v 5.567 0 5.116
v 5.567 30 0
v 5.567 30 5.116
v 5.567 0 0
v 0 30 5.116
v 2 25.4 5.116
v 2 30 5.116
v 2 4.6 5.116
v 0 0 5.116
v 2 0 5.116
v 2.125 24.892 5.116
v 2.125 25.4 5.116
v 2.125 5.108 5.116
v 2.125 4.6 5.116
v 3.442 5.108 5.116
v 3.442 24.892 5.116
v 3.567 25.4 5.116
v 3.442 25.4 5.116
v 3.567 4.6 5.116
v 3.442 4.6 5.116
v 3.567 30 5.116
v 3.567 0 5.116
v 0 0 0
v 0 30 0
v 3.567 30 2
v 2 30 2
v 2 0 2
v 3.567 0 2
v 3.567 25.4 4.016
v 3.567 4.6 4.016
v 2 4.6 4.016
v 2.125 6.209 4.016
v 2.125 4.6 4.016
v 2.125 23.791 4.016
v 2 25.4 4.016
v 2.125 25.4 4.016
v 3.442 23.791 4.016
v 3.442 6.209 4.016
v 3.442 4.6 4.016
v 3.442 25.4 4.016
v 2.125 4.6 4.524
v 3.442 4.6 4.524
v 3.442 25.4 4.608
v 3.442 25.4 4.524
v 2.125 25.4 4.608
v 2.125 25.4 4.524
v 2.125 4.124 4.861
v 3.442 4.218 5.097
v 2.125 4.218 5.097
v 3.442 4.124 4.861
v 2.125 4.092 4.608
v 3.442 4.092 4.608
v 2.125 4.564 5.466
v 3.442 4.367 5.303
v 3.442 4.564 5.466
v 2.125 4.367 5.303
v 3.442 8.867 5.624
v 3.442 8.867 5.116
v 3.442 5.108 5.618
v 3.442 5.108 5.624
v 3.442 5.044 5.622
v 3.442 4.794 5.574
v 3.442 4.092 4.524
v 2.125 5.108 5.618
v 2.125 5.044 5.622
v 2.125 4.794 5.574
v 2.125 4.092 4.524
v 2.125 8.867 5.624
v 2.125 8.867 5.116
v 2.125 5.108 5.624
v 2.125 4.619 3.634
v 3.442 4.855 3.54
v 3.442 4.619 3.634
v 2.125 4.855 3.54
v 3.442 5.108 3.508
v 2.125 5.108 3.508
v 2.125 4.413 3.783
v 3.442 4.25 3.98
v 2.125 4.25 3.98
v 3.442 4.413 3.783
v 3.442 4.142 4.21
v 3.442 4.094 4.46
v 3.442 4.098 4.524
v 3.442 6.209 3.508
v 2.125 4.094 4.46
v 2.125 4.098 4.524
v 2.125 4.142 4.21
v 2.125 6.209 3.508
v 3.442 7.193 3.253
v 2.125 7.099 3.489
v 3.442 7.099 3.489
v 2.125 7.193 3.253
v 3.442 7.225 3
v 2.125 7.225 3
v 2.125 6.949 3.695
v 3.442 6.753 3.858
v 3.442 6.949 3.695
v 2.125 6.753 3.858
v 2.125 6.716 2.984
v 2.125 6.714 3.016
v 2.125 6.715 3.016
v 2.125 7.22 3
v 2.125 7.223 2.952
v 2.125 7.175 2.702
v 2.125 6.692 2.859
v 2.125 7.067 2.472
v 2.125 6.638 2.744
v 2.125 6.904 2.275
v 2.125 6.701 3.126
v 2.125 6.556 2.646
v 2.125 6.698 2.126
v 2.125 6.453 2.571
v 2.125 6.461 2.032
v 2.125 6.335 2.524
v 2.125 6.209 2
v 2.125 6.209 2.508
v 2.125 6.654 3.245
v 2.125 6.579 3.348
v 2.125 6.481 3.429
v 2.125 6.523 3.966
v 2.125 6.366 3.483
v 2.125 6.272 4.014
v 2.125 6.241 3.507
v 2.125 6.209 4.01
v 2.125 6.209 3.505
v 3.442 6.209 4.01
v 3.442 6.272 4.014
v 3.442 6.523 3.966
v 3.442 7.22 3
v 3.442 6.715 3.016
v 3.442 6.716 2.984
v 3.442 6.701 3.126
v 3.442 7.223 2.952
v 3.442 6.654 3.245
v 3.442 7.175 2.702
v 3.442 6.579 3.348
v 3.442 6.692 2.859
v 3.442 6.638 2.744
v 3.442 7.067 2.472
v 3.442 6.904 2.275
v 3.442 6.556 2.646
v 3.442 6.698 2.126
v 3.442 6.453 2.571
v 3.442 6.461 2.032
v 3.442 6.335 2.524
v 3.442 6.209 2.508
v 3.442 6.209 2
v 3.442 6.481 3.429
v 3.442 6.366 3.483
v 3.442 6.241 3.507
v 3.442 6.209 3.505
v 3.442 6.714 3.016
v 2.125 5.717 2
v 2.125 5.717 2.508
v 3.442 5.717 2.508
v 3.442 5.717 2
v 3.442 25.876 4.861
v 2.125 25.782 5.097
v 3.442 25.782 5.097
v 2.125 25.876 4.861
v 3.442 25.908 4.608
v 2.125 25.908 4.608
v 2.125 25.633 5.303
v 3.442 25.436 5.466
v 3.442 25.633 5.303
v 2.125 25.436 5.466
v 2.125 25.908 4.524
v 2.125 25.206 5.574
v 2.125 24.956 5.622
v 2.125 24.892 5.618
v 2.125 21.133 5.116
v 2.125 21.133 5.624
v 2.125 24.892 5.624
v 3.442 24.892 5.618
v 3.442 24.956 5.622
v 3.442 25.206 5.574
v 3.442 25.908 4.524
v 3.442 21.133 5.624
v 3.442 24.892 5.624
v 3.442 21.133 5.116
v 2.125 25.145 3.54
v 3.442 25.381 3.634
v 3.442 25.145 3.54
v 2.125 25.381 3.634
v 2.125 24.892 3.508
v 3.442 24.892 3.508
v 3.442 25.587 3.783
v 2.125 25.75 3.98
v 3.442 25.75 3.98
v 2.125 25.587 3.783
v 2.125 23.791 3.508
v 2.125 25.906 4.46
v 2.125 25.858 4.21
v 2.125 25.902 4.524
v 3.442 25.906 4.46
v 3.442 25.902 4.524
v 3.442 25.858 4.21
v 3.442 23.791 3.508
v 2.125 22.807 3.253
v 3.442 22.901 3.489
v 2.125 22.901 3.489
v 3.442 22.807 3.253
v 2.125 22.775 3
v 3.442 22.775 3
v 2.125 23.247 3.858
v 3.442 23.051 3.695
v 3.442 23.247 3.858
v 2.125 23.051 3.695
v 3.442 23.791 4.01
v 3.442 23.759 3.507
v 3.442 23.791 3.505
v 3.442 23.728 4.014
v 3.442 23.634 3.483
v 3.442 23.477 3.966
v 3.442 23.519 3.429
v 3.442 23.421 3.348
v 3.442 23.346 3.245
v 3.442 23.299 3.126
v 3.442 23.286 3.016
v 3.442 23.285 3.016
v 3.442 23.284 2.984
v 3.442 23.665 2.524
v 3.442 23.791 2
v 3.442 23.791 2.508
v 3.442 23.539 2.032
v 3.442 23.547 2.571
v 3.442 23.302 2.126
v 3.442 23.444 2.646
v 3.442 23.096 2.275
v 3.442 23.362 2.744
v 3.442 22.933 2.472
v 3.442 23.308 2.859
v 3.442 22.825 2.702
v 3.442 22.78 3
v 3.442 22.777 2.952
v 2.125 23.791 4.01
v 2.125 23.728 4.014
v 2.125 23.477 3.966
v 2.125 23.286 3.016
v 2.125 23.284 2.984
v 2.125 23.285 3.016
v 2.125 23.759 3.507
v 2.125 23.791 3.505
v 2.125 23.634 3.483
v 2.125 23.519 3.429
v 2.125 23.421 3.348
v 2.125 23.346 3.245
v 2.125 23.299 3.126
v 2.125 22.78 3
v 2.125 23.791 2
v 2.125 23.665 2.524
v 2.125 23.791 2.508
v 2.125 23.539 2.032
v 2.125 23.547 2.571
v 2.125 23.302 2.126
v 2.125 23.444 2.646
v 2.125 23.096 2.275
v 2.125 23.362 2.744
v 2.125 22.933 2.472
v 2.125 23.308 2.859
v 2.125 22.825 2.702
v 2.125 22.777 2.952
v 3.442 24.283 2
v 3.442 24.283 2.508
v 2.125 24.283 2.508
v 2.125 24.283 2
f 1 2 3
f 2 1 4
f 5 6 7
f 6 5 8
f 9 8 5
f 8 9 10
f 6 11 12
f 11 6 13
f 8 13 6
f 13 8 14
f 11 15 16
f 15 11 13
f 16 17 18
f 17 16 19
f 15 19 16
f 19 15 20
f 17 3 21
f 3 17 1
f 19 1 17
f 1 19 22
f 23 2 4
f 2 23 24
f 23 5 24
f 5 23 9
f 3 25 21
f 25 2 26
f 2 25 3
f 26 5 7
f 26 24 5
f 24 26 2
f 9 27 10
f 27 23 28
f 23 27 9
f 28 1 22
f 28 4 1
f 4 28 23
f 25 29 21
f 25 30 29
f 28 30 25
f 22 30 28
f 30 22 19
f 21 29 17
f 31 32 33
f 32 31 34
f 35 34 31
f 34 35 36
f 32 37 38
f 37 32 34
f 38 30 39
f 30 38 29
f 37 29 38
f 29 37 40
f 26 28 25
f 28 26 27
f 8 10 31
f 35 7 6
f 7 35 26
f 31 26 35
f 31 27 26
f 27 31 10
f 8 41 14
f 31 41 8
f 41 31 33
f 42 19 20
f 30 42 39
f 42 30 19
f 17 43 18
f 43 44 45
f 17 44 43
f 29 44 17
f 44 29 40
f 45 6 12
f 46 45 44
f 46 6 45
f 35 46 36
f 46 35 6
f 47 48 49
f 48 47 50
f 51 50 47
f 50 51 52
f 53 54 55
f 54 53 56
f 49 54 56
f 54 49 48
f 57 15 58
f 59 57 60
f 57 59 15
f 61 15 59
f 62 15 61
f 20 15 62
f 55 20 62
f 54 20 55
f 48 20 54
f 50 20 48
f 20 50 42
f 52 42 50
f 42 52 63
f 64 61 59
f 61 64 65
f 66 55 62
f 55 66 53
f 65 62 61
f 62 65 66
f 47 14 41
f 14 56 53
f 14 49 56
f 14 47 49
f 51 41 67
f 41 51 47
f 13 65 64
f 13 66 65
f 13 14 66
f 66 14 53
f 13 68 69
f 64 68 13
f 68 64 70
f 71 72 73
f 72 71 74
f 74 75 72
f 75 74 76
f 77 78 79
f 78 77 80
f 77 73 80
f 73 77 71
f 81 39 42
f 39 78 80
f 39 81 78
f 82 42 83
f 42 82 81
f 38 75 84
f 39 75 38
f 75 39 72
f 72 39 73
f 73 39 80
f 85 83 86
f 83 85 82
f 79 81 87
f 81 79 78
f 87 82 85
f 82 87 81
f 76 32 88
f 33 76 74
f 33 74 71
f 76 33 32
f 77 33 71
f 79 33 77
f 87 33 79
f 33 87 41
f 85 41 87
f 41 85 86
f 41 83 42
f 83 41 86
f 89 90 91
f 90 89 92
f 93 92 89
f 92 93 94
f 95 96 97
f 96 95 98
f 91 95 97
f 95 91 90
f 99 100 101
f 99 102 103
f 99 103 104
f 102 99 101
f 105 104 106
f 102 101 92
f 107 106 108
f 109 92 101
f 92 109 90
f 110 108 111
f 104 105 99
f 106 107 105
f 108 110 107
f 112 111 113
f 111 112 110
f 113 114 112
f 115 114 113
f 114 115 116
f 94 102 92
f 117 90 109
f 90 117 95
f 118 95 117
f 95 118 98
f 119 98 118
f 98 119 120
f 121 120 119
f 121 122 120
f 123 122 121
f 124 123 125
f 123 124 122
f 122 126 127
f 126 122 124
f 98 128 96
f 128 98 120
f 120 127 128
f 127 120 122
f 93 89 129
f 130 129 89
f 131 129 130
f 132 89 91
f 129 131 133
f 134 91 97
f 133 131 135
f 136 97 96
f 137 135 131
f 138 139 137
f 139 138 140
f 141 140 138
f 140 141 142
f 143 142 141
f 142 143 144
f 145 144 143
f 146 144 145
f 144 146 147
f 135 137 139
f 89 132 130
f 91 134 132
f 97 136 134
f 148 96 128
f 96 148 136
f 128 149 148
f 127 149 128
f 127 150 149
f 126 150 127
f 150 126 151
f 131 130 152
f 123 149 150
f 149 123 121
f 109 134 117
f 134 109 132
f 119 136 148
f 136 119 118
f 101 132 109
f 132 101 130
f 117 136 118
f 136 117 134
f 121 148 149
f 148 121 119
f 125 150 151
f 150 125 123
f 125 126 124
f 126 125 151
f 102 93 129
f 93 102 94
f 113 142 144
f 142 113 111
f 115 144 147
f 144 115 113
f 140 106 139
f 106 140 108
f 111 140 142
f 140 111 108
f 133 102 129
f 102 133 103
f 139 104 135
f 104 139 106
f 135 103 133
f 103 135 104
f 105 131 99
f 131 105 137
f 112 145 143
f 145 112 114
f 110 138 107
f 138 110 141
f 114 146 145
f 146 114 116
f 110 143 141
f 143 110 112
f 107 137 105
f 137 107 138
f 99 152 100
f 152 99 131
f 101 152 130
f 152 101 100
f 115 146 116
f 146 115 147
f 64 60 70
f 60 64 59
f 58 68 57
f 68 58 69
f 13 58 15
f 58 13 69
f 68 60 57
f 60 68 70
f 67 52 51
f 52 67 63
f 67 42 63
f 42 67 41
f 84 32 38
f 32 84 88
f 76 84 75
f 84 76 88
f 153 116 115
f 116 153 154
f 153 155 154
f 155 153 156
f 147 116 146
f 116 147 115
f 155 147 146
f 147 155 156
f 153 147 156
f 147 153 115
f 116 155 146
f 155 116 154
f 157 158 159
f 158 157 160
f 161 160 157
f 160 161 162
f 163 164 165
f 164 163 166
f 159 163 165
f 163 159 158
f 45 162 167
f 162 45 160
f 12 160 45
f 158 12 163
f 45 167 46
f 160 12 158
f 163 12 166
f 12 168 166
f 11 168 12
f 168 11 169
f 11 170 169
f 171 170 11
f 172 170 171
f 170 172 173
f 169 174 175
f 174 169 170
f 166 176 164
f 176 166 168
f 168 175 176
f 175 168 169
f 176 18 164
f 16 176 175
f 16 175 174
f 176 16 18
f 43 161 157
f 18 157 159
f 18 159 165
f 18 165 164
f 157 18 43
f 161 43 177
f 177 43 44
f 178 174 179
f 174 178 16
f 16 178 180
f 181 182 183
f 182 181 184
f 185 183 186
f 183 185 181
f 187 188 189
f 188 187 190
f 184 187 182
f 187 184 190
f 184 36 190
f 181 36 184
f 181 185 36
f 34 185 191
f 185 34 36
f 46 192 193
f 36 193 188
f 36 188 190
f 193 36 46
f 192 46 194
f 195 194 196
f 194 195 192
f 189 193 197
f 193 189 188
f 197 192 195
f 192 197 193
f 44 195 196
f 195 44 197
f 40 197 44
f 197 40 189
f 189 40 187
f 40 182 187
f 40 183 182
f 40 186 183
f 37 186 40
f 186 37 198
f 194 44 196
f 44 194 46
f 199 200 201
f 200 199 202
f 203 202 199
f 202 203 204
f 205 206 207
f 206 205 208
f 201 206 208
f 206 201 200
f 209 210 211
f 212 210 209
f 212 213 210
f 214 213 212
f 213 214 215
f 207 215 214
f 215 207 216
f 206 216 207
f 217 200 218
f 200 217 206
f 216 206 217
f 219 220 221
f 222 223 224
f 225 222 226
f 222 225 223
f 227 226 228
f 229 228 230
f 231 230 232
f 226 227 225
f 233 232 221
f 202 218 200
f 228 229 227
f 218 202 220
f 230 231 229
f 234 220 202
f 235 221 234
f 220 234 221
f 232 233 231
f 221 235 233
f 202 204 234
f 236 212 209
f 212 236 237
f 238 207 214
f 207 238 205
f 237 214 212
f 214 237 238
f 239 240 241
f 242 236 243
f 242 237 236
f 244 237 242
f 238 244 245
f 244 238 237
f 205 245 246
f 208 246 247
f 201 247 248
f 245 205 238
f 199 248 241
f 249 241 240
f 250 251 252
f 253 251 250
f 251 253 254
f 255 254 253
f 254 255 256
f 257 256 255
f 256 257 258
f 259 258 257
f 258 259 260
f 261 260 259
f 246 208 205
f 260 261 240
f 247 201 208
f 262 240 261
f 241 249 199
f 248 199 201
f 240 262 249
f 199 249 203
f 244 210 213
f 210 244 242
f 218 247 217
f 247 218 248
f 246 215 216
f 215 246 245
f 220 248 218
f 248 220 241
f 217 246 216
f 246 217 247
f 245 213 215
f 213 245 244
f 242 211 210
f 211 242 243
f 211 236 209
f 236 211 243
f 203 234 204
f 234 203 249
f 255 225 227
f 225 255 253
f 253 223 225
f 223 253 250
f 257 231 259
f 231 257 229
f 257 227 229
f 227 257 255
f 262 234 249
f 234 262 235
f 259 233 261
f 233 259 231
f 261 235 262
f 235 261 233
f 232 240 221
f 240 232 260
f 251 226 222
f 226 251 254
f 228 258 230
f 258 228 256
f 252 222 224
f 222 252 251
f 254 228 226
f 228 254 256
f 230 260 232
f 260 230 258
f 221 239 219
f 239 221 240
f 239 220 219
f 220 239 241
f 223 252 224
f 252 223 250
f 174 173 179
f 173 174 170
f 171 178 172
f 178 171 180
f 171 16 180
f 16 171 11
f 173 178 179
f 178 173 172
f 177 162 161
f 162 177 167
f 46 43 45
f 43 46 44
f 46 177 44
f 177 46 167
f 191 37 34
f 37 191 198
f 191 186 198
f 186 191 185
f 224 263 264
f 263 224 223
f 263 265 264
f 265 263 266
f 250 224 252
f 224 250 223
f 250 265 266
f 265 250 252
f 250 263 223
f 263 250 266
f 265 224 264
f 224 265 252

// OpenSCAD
// file: util.scad
/*
    This file is part of the DodoHand project. This project aims to create 
    an open implementation of the DataHand keyboard, capable of being created
    with commercial 3D printing services.

    Copyright (C) 2014 Scott Fohey

    This program is free software: you can redistribute it and/or modify
    it under the terms of the GNU General Public License as published by
    the Free Software Foundation, either version 3 of the License, or
    (at your option) any later version.

    This program is distributed in the hope that it will be useful,
    but WITHOUT ANY WARRANTY; without even the implied warranty of
    MERCHANTABILITY or FITNESS FOR A PARTICULAR PURPOSE.  See the
    GNU General Public License for more details.

    You should have received a copy of the GNU General Public License
    along with this program.  If not, see <http://www.gnu.org/licenses/>.
*/

module half_cube(x, y, z) {

  polyhedron(points = [[0,0,0], [0, 0, z], [x, 0, 0], 
              [0,y,0], [0, y, z], [x, y, 0]], 
             faces = [[0,1,2], 
                      [0,3,4], [0,4,1], 
                      [1,4,5], [1,5,2], 
                      [2,5,3], [2,3,0],
                      [3,5,4]],
             convexity = 1);
}

module pos_cube(x, y, z, w, l, h) {
  translate([x, y, z]) cube([w, l, h]);
}

module pos_c_cube(x, y, z, w, l, h) {
  translate([x, y, z]) cube([w, l, h], center=true);
}

module pos_c_half_sphere(x, y, z, sr, f) {
  translate([x, y, z]) {
    difference() {
      sphere(r=sr, $fn=f, center=true);
      translate([-2.*sr, 0, -2*sr]) cube([4*sr, 4*sr, 4*sr]);
    } // difference
  } // translate
}
// file: LiteOn_P_100_E302.scad
/*
    This file is part of the DodoHand project. This project aims to create 
    an open implementation of the DataHand keyboard, capable of being created
    with commercial 3D printing services.

    Copyright (C) 2013 Scott Fohey

    This program is free software: you can redistribute it and/or modify
    it under the terms of the GNU General Public License as published by
    the Free Software Foundation, either version 3 of the License, or
    (at your option) any later version.

    This program is distributed in the hope that it will be useful,
    but WITHOUT ANY WARRANTY; without even the implied warranty of
    MERCHANTABILITY or FITNESS FOR A PARTICULAR PURPOSE.  See the
    GNU General Public License for more details.

    You should have received a copy of the GNU General Public License
    along with this program.  If not, see <http://www.gnu.org/licenses/>.
*/

include <dimensions.scad>;

module soldercone(a, b, c) {
  // cone for relief of material where solder may wick, and heat highest
  // echo("soldercone x,y,z:", a, ", ", b, ", ", c);
  translate([a, b, c]) {
    cylinder(r1 = sc_l_r, r2 = sc_u_r, h = sc_h, $fn=gfn);
  }
}

module Nom_Everlight_PT908_7B_F(x, y, z) {
  translate([x, y, z]) {
    rotate(a=90, v=[0,0,1]) {
      union() {
        color([0.15,0.15,0.15,1]) {
          cube([irlb_w, irlb_d, irlb_h]);
          translate([irle_x, irle_y, irle_z]) sphere(irle_r, $fn=gfn);
        }
        color("LightSteelBlue") {
          translate([irlcath_x, irll_y, -irptlead_h]) 
            cube([irll_w, irll_d, irptlead_h+csg_tol]);
          translate([irlanod_x, irll_y, -irptlead_h]) 
            cube([irll_w, irll_d, irptlead_h+csg_tol]);
        }
      }
    }
  }
}  


module Nom_LiteOn_P_100_E302(x, y, z) {
  translate([x, y, z]) {
    rotate(a=90, v=[0,0,1]) {
      union() {
        color("Salmon") {
          cube([irlb_w, irlb_d, irlb_h]);
          translate([irle_x, irle_y, irle_z]) sphere(irle_r, $fn=gfn);
        }
        color("LightSteelBlue") {
          translate([irlcath_x, irll_y, -irlcath_h]) 
            cube([irll_w, irll_d, irlcath_h+csg_tol]);
          translate([irlanod_x, irll_y, -irlanod_h]) 
            cube([irll_w, irll_d, irlanod_h+csg_tol]);
        }
      }
    }
  }
}  

// this is the shape of the part at it's maximum-tolerance size.
module Max_LiteOn_P_100_E302(x, y, z, scz) {
  translate([x, y, z]) {
    rotate(a=90, v=[0,0,1]) {
      union() {
        color("Salmon") {
          cube([irlb_m_w, irlb_m_d, irlb_m_h]);
          translate([irle_m_x, irle_m_y, irle_m_z]) 
            sphere(irle_m_r, $fn=gfn);
        }
        color("LightSteelBlue") {
          // make the leads thicker on the max part so that it can be used
          // for subtracting out of the volume of the carrier.
          translate([irlcath_m_x, irll_m_y, -irlcath_h]) 
            cube([irll_m_w, irll_m_d, irlcath_h+csg_tol]);
          translate([irlanod_m_x, irll_m_y, -irlanod_h]) 
            cube([irll_m_w, irll_m_d, irlanod_h+csg_tol]);
          soldercone(irlanod_m_x + irll_m_w/2, 
                      irll_m_y + irll_m_d/2, 
                      scz-z); 
          soldercone(irlcath_m_x + irll_m_w/2, 
                      irll_m_y + irll_m_d/2, 
                      scz-z);
        }
      }
    }
  }
}
// file: tdds.scad
/*
    This file is part of the DodoHand project. This project aims to create 
    an open implementation of the DataHand keyboard, capable of being created
    with commercial 3D printing services.

    Copyright (C) 2014 Scott Fohey

    This program is free software: you can redistribute it and/or modify
    it under the terms of the GNU General Public License as published by
    the Free Software Foundation, either version 3 of the License, or
    (at your option) any later version.

    This program is distributed in the hope that it will be useful,
    but WITHOUT ANY WARRANTY; without even the implied warranty of
    MERCHANTABILITY or FITNESS FOR A PARTICULAR PURPOSE.  See the
    GNU General Public License for more details.

    You should have received a copy of the GNU General Public License
    along with this program.  If not, see <http://www.gnu.org/licenses/>.
*/

use <carrier.scad>;
use <util.scad>;

include <dimensions.scad>;

module tdds(x, y, z, sc) {
// sc == show clip
  translate([x, y, z]) {
    difference() {
      pos_cube(tdds_bar_x, tdds_bar_y, tdds_bar_z, 
               tdds_bar_w, tdds_bar_l, tdds_bar_h);
      // now start removing the parts that shouldn't be there

      pos_cube(tdds_cbv_x, tdds_cbv_y, tdds_cbv_z,
               tdds_cbv_w, tdds_cbv_l, tdds_cbv_h);
      
      pos_cube(tdds_sub_x, tdds_sub_y, tdds_sub_z,
               tdds_sub_w, tdds_sub_l, tdds_sub_h);

      pos_cube(tdds_sub2_x, tdds_sub2_y, tdds_sub2_z,
               tdds_sub_w, tdds_sub_l, tdds_sub_h);
    } // end difference

    if(1 == sc) {
      translate([tdds_clip_x, tdds_clip_y, tdds_clip_z])
      translate([0, 0, clip_mat_t]) 
        rotate(a=180, v=[0,0,1]) rotate(a=-90, v=[1,0,0]) 
          clip(0, 0, 0);

      translate([tdds_clip_x - clip_w, tdds_bar_l - tdds_clip_y, tdds_clip_z])
      translate([0, 0, clip_mat_t]) 
        rotate(a=-90, v=[1,0,0]) 
          clip(0, 0, 0);



    }

  } // end translate
}
// main file
/*
    This file is part of the DodoHand project. This project aims to create 
    an open implementation of the DataHand keyboard, capable of being created
    with commercial 3D printing services.

    Copyright (C) 2014 Scott Fohey

    This program is free software: you can redistribute it and/or modify
    it under the terms of the GNU General Public License as published by
    the Free Software Foundation, either version 3 of the License, or
    (at your option) any later version.

    This program is distributed in the hope that it will be useful,
    but WITHOUT ANY WARRANTY; without even the implied warranty of
    MERCHANTABILITY or FITNESS FOR A PARTICULAR PURPOSE.  See the
    GNU General Public License for more details.

    You should have received a copy of the GNU General Public License
    along with this program.  If not, see <http://www.gnu.org/licenses/>.
*/

use <tdds.scad>;
use <LiteOn_P_100_E302.scad>;

include <dimensions.scad>;

tdds(0, 0, 0, 1);
